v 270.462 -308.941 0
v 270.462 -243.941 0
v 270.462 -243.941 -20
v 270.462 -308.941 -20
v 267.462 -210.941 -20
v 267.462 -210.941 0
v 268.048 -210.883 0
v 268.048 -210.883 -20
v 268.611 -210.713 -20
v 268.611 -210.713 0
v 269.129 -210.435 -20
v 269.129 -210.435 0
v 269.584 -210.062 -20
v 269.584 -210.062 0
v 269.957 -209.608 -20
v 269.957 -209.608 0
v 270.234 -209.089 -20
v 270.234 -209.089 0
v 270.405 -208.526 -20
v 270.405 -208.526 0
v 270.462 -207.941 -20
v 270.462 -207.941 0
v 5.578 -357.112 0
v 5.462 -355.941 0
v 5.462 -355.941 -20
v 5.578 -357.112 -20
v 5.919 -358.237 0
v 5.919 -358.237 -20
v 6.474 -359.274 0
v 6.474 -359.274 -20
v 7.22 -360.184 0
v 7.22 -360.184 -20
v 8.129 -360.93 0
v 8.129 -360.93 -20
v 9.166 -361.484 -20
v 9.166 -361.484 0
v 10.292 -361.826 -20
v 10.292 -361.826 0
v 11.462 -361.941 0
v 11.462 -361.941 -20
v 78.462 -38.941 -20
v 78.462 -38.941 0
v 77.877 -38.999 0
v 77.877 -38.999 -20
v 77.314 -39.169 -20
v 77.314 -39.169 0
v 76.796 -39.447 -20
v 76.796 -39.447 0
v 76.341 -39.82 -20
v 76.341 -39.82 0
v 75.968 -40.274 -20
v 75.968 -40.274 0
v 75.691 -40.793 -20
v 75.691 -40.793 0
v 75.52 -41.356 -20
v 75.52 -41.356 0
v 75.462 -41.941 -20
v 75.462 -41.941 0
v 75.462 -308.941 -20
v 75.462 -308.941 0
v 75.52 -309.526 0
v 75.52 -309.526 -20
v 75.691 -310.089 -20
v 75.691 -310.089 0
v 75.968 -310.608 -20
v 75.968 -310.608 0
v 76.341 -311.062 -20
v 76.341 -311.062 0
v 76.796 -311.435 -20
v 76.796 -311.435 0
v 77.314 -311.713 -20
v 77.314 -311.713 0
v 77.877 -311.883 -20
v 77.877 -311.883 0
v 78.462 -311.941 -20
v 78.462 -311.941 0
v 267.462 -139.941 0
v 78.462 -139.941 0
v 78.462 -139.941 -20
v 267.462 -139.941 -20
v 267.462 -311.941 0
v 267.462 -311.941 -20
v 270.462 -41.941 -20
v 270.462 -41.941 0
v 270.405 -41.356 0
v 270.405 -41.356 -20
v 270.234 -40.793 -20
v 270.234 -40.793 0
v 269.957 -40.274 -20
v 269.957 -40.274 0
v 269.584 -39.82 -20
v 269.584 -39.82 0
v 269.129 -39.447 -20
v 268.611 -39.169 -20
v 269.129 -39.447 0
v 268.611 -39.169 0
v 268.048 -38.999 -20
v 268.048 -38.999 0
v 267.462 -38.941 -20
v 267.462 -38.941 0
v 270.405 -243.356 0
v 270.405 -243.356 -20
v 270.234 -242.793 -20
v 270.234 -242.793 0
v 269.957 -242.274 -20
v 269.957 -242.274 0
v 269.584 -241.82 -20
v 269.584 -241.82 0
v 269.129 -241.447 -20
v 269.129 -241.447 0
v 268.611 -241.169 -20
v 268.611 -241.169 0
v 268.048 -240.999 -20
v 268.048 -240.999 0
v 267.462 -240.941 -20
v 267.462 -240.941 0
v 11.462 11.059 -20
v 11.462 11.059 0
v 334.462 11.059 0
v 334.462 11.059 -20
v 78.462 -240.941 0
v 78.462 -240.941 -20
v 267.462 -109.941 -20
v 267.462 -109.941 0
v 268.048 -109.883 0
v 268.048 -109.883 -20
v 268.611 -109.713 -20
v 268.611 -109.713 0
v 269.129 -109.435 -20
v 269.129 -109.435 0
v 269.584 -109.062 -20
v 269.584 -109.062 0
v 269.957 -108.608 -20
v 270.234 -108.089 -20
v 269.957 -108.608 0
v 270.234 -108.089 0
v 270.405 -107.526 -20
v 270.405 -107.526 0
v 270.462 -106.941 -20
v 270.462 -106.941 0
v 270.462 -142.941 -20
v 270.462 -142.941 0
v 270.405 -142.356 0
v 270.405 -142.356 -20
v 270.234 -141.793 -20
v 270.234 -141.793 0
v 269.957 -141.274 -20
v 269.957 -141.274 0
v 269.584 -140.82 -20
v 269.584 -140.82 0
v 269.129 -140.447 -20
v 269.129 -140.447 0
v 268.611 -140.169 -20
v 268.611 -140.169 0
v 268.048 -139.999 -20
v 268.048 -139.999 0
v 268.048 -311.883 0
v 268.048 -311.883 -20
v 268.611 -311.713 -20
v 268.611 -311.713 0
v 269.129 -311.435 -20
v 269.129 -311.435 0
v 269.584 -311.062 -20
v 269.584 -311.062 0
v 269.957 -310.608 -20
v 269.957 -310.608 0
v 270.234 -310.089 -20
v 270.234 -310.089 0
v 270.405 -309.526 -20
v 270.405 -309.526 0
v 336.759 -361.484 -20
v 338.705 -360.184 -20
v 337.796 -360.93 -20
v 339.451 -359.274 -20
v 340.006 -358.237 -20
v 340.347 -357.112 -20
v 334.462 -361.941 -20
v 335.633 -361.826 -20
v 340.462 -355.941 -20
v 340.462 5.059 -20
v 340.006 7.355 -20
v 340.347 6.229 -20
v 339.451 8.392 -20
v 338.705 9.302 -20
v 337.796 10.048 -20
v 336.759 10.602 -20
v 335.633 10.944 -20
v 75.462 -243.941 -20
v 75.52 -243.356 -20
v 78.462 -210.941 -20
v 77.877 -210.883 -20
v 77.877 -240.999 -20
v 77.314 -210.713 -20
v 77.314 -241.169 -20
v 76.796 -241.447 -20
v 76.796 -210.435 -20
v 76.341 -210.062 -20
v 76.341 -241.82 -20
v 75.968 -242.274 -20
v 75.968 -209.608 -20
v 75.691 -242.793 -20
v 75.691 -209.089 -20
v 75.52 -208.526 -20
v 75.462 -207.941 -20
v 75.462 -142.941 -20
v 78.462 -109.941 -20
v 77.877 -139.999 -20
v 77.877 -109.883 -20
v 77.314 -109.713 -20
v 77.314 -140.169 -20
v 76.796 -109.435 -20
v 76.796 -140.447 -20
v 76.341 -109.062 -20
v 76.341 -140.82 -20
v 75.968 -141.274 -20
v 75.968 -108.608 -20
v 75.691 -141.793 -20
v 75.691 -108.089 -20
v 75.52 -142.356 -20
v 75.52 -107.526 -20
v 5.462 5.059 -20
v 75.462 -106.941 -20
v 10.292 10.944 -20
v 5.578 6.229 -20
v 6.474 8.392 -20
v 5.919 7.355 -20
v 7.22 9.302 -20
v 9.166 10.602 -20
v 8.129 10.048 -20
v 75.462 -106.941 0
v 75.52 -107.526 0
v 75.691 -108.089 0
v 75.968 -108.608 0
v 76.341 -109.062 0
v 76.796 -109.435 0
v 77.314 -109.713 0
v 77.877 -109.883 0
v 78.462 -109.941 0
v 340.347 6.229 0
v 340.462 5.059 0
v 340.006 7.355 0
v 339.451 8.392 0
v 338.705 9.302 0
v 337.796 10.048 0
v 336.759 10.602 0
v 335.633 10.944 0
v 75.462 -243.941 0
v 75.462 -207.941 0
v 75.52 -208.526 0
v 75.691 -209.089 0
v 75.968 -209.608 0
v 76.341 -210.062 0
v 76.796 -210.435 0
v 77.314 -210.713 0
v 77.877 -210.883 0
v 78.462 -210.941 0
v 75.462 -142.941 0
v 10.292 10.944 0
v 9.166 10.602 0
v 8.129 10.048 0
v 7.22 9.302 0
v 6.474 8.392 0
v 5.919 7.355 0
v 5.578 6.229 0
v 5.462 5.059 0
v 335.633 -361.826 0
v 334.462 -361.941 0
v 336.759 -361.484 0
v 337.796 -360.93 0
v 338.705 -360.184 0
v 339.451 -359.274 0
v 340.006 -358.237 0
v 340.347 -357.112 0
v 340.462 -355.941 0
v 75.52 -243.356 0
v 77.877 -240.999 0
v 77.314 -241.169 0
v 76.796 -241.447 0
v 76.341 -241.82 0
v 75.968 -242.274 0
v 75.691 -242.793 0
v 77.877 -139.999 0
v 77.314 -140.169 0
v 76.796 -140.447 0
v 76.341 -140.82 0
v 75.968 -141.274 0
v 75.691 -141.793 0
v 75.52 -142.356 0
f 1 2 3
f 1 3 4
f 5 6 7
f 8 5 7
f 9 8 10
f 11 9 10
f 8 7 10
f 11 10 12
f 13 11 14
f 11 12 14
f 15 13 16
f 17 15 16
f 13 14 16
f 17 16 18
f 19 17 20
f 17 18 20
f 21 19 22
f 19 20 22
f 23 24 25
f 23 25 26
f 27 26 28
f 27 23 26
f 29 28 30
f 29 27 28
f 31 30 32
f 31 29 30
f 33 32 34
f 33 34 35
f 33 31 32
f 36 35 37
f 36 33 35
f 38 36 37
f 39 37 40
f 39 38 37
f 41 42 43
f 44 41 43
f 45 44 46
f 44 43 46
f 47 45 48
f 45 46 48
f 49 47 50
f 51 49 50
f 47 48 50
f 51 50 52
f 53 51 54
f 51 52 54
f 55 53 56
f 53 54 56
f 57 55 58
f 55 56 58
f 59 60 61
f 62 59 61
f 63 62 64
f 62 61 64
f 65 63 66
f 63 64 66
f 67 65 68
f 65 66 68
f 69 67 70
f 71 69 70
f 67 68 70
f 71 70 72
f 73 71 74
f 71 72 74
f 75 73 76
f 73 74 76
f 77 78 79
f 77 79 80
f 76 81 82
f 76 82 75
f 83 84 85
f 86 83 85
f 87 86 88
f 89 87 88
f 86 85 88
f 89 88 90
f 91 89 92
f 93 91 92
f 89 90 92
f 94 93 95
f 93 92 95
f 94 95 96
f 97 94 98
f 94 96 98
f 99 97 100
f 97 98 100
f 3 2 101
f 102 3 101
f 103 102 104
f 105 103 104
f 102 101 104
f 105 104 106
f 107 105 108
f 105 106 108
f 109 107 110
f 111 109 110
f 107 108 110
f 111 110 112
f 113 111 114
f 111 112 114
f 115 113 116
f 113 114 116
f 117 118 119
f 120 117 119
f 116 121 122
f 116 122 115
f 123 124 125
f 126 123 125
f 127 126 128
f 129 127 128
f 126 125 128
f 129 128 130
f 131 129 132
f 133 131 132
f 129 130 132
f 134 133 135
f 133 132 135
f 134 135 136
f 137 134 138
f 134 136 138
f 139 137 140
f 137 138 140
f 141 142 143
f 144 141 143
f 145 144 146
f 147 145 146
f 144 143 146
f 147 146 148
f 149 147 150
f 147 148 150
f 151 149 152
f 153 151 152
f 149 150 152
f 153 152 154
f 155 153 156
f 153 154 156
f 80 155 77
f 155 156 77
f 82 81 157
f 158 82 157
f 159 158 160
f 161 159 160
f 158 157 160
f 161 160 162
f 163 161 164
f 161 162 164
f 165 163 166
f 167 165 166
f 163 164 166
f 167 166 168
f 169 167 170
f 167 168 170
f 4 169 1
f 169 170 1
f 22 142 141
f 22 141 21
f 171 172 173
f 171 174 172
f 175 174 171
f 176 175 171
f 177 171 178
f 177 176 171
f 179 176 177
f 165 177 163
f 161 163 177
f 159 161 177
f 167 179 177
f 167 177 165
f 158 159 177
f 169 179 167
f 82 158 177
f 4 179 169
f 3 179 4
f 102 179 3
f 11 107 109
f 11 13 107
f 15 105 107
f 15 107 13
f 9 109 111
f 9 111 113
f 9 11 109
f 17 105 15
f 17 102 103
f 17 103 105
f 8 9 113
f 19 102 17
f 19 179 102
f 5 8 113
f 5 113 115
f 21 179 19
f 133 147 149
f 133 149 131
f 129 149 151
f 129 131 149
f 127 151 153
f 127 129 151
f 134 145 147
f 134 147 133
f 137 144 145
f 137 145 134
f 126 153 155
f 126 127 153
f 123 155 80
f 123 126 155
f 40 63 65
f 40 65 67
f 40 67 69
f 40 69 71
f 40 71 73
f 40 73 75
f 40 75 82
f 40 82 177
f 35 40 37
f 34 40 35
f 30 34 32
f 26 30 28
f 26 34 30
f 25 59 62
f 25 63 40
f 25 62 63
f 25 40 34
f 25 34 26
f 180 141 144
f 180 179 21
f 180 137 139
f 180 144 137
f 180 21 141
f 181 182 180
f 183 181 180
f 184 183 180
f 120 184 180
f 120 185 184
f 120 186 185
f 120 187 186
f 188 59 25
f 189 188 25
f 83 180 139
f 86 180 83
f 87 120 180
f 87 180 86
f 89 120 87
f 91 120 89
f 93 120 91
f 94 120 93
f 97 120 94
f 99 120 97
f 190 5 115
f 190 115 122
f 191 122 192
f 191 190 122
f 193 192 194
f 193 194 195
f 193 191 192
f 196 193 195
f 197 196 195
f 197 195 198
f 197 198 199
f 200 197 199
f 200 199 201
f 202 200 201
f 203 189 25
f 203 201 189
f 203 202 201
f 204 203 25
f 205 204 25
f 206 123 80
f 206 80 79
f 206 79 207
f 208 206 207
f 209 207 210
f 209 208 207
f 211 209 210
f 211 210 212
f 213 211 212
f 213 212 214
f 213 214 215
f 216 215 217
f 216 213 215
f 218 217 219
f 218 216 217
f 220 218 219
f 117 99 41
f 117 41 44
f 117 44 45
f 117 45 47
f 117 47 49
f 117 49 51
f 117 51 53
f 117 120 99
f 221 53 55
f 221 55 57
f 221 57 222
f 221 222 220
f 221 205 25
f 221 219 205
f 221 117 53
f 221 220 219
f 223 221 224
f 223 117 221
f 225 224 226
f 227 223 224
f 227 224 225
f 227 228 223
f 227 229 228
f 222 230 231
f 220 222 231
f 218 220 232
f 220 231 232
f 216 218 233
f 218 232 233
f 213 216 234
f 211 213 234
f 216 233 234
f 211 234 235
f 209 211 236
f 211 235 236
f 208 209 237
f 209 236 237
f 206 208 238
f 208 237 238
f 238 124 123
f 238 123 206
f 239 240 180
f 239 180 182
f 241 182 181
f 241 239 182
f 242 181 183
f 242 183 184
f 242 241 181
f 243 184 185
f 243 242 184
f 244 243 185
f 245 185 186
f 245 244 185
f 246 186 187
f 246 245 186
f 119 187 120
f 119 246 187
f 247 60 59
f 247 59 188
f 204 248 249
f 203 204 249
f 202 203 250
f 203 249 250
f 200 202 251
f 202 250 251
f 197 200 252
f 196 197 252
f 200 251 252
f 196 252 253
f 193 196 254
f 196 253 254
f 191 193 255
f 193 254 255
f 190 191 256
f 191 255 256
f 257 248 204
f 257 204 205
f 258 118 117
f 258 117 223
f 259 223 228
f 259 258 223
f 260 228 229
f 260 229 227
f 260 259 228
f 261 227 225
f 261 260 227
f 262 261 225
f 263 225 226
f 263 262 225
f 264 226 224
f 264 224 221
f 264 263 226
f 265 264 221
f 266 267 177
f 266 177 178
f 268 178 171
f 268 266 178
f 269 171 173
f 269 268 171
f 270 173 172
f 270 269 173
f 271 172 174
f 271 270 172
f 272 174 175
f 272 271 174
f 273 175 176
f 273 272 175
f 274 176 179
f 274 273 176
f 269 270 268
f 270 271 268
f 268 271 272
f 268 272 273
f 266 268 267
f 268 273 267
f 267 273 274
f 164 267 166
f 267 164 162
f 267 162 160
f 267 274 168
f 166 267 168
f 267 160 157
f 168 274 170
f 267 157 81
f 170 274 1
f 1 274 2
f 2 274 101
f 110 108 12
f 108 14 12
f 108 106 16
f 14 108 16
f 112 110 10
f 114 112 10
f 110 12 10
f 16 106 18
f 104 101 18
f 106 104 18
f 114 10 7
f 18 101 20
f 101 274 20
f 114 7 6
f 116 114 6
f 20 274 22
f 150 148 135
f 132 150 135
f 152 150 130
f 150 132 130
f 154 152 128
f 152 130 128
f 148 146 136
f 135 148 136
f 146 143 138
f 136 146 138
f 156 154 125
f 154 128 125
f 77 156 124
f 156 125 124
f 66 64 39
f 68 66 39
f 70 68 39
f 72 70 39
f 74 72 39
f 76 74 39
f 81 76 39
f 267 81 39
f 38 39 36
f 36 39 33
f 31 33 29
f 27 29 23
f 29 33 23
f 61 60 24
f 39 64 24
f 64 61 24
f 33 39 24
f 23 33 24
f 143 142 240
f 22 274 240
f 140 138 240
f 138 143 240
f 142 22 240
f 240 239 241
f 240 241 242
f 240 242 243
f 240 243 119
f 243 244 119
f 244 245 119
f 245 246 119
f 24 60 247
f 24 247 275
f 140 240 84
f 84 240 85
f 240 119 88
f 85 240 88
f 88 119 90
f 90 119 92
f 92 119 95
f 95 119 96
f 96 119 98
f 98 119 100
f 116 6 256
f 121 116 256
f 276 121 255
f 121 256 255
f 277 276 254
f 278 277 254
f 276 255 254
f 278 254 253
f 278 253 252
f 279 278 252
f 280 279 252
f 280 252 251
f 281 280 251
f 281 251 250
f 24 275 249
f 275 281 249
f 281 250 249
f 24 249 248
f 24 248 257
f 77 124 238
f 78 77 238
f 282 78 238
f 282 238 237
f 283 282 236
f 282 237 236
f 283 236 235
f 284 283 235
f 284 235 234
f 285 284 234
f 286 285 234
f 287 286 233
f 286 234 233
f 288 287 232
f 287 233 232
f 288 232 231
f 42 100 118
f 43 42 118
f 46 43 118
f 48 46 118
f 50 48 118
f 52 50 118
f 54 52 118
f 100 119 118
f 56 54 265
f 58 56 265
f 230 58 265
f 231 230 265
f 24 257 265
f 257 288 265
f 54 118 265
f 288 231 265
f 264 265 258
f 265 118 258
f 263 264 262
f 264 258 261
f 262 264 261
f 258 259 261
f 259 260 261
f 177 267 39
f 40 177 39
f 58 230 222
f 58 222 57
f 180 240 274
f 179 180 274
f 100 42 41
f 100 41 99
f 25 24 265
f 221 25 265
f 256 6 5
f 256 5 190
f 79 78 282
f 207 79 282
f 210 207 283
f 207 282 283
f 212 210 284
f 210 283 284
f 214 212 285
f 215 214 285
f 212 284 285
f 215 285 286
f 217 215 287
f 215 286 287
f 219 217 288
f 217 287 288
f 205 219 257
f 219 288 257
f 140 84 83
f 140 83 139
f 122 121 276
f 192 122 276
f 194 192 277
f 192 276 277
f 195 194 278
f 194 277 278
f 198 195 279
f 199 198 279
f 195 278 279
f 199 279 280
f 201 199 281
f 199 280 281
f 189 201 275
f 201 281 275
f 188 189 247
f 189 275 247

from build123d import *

# Parameters (mm, degrees)
PAD002_DEPTH = 20


with BuildPart() as part:
    # Sketch002 → Pad002 (new body)
    with BuildSketch(Plane.XY):
        with BuildLine():
            Line((11.462484, 11.058947), (334.462484, 11.058947))
            ThreePointArc((340.462484, 5.058947), (338.705124, 9.301588), (334.462484, 11.058947))
            Line((340.462484, 5.058947), (340.462484, -355.941053))
            ThreePointArc((334.462484, -361.941053), (338.705124, -360.183694), (340.462484, -355.941053))
            Line((334.462484, -361.941053), (11.462484, -361.941053))
            ThreePointArc((5.462484, -355.941053), (7.219843, -360.183694), (11.462484, -361.941053))
            Line((5.462484, -355.941053), (5.462484, 5.058947))
            ThreePointArc((11.462484, 11.058947), (7.219843, 9.301588), (5.462484, 5.058947))
        make_face()
        with BuildLine():
            Line((78.462484, -38.941053), (267.462484, -38.941053))
            ThreePointArc((270.462484, -41.941053), (269.583804, -39.819733), (267.462484, -38.941053))
            Line((270.462484, -41.941053), (270.462484, -106.941053))
            ThreePointArc((267.462484, -109.941053), (269.583804, -109.062373), (270.462484, -106.941053))
            Line((267.462484, -109.941053), (78.462484, -109.941053))
            ThreePointArc((75.462484, -106.941053), (76.341163, -109.062373), (78.462484, -109.941053))
            Line((75.462484, -106.941053), (75.462484, -41.941053))
            ThreePointArc((78.462484, -38.941053), (76.341163, -39.819733), (75.462484, -41.941053))
        make_face(mode=Mode.SUBTRACT)
        with BuildLine():
            Line((78.462484, -139.941053), (267.462484, -139.941053))
            ThreePointArc((270.462484, -142.941053), (269.583804, -140.819733), (267.462484, -139.941053))
            Line((270.462484, -142.941053), (270.462484, -207.941053))
            ThreePointArc((267.462484, -210.941053), (269.583804, -210.062373), (270.462484, -207.941053))
            Line((267.462484, -210.941053), (78.462484, -210.941053))
            ThreePointArc((75.462484, -207.941053), (76.341163, -210.062373), (78.462484, -210.941053))
            Line((75.462484, -207.941053), (75.462484, -142.941053))
            ThreePointArc((78.462484, -139.941053), (76.341163, -140.819733), (75.462484, -142.941053))
        make_face(mode=Mode.SUBTRACT)
        with BuildLine():
            Line((78.462484, -240.941053), (267.462484, -240.941053))
            ThreePointArc((270.462484, -243.941053), (269.583804, -241.819733), (267.462484, -240.941053))
            Line((270.462484, -243.941053), (270.462484, -308.941053))
            ThreePointArc((267.462484, -311.941053), (269.583804, -311.062373), (270.462484, -308.941053))
            Line((267.462484, -311.941053), (78.462484, -311.941053))
            ThreePointArc((75.462484, -308.941053), (76.341163, -311.062373), (78.462484, -311.941053))
            Line((75.462484, -308.941053), (75.462484, -243.941053))
            ThreePointArc((78.462484, -240.941053), (76.341163, -241.819733), (75.462484, -243.941053))
        make_face(mode=Mode.SUBTRACT)
    extrude(amount=-PAD002_DEPTH)


solid = part.part
